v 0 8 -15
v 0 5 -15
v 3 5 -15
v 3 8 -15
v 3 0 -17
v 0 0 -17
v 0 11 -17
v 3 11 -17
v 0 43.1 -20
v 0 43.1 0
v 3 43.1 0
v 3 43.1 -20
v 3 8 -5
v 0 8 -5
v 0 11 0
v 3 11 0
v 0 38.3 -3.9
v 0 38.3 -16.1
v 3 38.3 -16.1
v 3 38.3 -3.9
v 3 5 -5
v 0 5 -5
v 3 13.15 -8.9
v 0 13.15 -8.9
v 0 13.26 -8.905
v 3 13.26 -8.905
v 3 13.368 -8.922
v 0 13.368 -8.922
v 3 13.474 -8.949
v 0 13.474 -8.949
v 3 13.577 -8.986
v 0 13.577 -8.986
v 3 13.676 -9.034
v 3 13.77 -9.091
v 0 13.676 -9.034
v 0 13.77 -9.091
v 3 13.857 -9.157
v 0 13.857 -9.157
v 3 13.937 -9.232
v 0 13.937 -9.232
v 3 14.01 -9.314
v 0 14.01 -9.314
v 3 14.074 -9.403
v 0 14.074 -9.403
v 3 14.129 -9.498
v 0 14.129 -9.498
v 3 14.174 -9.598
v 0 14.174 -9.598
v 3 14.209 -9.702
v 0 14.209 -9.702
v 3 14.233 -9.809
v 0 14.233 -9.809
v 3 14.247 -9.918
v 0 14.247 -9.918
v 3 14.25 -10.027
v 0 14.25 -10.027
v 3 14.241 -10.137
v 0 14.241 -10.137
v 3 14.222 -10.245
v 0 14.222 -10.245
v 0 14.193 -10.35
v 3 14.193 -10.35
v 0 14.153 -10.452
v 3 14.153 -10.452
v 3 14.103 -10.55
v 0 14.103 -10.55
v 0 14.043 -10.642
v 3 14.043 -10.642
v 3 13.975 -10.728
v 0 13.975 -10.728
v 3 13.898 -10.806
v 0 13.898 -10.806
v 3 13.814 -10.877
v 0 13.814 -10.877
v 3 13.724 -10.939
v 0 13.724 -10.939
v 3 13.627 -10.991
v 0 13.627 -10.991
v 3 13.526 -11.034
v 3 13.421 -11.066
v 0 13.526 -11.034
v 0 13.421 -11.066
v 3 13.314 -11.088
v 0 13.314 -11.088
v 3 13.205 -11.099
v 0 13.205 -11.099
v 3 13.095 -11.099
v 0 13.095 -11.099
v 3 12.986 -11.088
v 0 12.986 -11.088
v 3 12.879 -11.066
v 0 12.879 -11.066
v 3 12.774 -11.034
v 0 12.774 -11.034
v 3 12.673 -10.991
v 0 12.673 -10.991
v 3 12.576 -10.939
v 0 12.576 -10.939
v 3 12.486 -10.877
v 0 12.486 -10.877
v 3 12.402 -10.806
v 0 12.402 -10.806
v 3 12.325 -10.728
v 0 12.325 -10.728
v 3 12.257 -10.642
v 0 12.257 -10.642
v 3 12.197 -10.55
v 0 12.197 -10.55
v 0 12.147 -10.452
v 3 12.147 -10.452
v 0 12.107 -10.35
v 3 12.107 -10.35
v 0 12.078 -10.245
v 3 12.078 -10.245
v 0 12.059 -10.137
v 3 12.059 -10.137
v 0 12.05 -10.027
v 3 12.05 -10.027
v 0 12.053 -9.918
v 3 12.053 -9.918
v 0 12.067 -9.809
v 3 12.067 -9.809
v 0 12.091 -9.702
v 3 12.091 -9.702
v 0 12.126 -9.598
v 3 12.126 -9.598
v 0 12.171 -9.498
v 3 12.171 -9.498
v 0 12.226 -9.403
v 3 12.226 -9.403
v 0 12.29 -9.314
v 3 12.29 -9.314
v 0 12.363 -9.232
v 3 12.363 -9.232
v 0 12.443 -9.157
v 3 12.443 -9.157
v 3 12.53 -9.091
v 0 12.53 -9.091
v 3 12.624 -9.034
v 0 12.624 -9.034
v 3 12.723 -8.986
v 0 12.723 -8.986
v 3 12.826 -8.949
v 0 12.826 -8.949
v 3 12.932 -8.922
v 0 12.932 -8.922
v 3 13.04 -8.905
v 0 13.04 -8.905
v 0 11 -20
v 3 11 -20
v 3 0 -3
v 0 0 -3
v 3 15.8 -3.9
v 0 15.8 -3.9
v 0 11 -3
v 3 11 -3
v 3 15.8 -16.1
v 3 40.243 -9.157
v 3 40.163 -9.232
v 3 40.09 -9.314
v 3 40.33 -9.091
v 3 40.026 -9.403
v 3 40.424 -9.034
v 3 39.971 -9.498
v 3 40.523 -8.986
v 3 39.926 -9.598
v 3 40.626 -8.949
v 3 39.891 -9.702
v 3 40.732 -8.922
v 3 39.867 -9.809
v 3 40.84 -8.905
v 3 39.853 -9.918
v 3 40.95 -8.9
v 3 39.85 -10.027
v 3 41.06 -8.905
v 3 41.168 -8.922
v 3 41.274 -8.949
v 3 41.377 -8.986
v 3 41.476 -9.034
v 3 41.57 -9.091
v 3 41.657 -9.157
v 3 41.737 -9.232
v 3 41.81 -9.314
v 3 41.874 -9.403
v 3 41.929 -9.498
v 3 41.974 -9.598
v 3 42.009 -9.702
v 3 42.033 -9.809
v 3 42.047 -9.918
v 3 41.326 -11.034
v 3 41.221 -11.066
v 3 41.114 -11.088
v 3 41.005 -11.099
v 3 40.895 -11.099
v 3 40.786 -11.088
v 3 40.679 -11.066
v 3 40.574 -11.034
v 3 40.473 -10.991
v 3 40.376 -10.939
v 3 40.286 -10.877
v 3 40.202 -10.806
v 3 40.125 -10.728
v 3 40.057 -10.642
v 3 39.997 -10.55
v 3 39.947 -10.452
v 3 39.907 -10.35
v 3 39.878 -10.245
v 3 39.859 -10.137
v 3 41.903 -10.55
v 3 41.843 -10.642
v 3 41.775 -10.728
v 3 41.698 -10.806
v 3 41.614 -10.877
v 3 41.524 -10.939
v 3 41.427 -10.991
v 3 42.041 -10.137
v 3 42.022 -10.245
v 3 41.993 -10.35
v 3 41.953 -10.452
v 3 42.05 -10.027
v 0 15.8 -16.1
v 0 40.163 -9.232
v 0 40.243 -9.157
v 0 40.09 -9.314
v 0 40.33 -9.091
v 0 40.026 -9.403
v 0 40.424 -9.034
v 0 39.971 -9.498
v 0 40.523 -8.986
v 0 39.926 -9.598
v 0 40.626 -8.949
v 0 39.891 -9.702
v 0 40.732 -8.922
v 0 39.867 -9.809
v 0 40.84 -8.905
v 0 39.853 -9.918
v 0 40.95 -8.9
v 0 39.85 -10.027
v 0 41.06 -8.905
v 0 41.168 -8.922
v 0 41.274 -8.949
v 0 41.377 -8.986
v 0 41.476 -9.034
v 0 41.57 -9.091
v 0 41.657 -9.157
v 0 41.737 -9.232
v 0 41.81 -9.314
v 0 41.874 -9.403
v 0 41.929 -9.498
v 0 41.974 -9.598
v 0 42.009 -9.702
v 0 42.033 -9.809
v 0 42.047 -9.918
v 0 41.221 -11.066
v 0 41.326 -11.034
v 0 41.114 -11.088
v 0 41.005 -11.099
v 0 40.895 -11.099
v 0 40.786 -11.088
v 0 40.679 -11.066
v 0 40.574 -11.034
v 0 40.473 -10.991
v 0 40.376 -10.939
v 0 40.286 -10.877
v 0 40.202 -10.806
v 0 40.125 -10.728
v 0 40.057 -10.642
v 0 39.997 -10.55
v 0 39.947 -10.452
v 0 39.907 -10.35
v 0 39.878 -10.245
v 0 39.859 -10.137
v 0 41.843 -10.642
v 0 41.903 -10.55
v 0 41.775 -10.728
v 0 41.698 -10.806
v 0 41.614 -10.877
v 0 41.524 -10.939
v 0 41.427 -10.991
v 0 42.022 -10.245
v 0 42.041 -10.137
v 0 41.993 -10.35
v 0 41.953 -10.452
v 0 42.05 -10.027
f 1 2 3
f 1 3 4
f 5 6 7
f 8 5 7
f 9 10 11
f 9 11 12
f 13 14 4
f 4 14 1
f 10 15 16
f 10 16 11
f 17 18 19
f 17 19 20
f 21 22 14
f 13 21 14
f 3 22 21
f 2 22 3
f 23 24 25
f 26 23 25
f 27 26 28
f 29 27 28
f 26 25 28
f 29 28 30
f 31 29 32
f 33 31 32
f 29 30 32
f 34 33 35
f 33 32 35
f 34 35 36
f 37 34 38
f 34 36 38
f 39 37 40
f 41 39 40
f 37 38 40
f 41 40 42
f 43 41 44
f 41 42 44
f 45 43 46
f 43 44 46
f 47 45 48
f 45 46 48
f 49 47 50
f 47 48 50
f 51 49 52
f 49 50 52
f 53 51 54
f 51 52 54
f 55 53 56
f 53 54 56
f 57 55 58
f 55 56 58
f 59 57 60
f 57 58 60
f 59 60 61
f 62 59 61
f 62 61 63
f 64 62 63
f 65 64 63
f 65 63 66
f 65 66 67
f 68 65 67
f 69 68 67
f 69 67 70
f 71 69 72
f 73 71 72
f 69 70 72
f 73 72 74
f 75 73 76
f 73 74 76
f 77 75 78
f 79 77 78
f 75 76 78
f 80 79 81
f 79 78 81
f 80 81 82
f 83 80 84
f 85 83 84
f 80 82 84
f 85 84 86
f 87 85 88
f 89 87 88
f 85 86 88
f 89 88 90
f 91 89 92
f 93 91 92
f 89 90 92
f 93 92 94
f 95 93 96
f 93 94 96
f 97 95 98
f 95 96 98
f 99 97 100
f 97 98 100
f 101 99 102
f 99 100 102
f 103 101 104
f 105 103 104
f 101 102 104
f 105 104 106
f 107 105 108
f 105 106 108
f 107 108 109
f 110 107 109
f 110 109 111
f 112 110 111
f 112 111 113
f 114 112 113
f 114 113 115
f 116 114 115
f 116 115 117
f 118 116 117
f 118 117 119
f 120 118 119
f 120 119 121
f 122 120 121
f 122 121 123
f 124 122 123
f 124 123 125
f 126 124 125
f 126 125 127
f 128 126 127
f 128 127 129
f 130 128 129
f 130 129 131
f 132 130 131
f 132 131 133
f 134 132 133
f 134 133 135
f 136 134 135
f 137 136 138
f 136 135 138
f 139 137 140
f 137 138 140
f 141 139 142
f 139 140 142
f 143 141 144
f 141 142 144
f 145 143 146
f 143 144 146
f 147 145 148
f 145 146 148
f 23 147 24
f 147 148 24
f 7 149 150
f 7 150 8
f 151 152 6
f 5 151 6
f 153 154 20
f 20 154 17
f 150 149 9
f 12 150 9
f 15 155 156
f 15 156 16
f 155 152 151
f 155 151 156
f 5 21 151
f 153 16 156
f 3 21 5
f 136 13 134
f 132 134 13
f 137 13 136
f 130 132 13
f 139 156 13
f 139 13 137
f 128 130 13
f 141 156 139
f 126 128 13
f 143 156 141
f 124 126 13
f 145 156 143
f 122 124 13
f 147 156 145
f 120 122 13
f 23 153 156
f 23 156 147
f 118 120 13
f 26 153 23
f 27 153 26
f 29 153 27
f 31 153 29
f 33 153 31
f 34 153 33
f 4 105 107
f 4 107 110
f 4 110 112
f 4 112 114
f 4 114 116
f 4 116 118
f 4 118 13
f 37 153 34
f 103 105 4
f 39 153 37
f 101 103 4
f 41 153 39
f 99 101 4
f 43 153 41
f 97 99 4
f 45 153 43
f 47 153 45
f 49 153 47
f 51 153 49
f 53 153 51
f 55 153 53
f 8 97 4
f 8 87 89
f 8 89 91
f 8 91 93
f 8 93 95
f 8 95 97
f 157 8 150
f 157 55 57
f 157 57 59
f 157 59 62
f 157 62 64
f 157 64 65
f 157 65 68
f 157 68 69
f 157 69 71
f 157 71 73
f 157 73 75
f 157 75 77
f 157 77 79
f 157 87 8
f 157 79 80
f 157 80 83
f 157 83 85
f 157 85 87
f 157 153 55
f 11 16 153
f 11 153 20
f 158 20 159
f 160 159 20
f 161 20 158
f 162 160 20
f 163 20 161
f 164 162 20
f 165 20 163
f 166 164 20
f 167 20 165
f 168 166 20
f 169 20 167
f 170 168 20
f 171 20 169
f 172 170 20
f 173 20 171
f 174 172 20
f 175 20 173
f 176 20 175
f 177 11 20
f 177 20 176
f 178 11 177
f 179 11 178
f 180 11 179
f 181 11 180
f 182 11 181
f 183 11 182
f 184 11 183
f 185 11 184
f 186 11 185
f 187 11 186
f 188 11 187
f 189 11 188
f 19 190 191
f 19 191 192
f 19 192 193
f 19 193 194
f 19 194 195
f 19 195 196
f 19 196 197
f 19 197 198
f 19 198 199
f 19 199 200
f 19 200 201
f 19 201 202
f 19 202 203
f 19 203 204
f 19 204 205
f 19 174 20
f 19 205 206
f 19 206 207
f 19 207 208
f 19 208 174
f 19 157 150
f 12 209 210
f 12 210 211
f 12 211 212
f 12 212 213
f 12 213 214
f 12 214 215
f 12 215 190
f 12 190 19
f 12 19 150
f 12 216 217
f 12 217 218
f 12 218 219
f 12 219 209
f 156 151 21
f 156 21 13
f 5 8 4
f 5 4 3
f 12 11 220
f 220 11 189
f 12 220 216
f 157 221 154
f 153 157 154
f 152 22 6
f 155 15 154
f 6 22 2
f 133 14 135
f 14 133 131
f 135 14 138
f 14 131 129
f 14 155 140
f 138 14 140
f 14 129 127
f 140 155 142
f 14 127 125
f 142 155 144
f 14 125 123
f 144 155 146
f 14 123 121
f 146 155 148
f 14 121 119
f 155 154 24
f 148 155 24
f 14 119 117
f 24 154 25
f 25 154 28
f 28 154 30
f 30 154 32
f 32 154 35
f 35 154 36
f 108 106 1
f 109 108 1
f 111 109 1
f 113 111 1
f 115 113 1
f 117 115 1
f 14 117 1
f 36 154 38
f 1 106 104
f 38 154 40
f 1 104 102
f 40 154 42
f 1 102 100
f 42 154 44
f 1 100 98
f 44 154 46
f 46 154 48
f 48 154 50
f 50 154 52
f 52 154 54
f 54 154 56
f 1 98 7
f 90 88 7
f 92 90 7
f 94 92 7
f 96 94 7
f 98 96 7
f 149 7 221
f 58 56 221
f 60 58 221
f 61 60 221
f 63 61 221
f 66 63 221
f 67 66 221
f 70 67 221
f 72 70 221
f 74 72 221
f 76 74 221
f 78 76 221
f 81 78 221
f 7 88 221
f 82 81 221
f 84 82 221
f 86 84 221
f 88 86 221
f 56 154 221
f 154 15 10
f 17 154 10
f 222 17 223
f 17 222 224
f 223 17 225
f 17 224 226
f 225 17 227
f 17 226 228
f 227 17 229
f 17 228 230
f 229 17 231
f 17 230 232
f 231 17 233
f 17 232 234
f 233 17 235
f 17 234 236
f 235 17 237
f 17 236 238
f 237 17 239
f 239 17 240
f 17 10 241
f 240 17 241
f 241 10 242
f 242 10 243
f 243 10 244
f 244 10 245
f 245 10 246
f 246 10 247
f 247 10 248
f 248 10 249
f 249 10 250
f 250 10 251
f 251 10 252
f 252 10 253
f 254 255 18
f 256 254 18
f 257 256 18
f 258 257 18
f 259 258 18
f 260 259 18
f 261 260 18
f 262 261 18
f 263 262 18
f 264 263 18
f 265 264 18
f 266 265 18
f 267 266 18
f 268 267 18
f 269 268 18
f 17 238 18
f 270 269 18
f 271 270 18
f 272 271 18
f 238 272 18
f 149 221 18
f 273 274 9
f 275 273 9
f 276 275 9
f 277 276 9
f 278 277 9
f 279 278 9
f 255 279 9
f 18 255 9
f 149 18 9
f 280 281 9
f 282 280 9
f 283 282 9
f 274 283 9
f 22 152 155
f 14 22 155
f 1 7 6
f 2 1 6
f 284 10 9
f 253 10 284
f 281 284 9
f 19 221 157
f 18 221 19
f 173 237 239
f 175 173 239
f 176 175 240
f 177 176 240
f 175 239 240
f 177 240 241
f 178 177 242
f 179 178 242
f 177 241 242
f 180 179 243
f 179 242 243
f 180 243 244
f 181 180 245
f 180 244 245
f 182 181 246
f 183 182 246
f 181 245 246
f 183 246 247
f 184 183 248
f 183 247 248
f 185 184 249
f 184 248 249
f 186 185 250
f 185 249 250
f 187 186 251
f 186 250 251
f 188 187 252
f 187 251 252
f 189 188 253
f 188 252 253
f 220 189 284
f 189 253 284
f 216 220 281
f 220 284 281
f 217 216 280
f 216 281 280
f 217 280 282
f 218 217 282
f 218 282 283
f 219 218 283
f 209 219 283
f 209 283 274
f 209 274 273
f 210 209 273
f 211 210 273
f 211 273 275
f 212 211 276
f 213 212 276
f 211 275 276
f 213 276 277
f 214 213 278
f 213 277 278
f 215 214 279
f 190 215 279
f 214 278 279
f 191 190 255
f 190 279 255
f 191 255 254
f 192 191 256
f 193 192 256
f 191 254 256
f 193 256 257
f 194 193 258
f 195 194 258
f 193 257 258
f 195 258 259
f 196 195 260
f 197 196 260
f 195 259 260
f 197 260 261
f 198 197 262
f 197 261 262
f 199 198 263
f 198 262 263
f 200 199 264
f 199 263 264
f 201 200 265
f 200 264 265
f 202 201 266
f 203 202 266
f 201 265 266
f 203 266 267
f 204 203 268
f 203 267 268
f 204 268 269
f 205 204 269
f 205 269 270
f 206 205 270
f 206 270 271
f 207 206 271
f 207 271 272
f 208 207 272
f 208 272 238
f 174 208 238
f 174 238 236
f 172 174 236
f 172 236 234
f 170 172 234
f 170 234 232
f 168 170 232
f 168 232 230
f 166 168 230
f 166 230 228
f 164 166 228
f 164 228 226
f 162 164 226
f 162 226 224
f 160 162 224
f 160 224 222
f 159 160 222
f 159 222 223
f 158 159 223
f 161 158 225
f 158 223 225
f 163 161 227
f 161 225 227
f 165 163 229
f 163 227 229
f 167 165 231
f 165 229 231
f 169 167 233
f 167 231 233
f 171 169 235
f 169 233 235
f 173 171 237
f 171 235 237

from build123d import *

# Parameters (mm, degrees)
SKETCH1_W           = 20
SKETCH1_H           = 43.1
SKETCH1_W_2         = 10
SKETCH1_H_2         = 3
BOSS_EXTRUDE1_DEPTH = 3
SKETCH2_R           = 1.1
SKETCH2_W           = 12.2
SKETCH2_H           = 22.5
SKETCH2_W_2         = 3
SKETCH2_H_2         = 11
CUT_EXTRUDE1_DEPTH  = 3


with BuildPart() as part:
    # Sketch1 → Boss-Extrude1 (new body)
    with BuildSketch(Plane(origin=(0, 0, 0), x_dir=(0, 0, -1), z_dir=(1, 0, 0))):
        with Locations((10, 21.55)):
            Rectangle(SKETCH1_W, SKETCH1_H)
        with Locations((10, 6.5)):
            Rectangle(SKETCH1_W_2, SKETCH1_H_2, mode=Mode.SUBTRACT)
    extrude(amount=BOSS_EXTRUDE1_DEPTH)

    # Sketch2 → Cut-Extrude1 (cut)
    with BuildSketch(Plane.ZY):
        with Locations((-10, 40.95)):
            Circle(SKETCH2_R)
        with Locations((-10, 13.15)):
            Circle(SKETCH2_R)
        with Locations((-10, 27.05)):
            Rectangle(SKETCH2_W, SKETCH2_H)
        with Locations((-18.5, 5.5)):
            Rectangle(SKETCH2_W_2, SKETCH2_H_2)
        with Locations((-1.5, 5.5)):
            Rectangle(SKETCH2_W_2, SKETCH2_H_2)
    extrude(amount=-CUT_EXTRUDE1_DEPTH, mode=Mode.SUBTRACT)


solid = part.part
